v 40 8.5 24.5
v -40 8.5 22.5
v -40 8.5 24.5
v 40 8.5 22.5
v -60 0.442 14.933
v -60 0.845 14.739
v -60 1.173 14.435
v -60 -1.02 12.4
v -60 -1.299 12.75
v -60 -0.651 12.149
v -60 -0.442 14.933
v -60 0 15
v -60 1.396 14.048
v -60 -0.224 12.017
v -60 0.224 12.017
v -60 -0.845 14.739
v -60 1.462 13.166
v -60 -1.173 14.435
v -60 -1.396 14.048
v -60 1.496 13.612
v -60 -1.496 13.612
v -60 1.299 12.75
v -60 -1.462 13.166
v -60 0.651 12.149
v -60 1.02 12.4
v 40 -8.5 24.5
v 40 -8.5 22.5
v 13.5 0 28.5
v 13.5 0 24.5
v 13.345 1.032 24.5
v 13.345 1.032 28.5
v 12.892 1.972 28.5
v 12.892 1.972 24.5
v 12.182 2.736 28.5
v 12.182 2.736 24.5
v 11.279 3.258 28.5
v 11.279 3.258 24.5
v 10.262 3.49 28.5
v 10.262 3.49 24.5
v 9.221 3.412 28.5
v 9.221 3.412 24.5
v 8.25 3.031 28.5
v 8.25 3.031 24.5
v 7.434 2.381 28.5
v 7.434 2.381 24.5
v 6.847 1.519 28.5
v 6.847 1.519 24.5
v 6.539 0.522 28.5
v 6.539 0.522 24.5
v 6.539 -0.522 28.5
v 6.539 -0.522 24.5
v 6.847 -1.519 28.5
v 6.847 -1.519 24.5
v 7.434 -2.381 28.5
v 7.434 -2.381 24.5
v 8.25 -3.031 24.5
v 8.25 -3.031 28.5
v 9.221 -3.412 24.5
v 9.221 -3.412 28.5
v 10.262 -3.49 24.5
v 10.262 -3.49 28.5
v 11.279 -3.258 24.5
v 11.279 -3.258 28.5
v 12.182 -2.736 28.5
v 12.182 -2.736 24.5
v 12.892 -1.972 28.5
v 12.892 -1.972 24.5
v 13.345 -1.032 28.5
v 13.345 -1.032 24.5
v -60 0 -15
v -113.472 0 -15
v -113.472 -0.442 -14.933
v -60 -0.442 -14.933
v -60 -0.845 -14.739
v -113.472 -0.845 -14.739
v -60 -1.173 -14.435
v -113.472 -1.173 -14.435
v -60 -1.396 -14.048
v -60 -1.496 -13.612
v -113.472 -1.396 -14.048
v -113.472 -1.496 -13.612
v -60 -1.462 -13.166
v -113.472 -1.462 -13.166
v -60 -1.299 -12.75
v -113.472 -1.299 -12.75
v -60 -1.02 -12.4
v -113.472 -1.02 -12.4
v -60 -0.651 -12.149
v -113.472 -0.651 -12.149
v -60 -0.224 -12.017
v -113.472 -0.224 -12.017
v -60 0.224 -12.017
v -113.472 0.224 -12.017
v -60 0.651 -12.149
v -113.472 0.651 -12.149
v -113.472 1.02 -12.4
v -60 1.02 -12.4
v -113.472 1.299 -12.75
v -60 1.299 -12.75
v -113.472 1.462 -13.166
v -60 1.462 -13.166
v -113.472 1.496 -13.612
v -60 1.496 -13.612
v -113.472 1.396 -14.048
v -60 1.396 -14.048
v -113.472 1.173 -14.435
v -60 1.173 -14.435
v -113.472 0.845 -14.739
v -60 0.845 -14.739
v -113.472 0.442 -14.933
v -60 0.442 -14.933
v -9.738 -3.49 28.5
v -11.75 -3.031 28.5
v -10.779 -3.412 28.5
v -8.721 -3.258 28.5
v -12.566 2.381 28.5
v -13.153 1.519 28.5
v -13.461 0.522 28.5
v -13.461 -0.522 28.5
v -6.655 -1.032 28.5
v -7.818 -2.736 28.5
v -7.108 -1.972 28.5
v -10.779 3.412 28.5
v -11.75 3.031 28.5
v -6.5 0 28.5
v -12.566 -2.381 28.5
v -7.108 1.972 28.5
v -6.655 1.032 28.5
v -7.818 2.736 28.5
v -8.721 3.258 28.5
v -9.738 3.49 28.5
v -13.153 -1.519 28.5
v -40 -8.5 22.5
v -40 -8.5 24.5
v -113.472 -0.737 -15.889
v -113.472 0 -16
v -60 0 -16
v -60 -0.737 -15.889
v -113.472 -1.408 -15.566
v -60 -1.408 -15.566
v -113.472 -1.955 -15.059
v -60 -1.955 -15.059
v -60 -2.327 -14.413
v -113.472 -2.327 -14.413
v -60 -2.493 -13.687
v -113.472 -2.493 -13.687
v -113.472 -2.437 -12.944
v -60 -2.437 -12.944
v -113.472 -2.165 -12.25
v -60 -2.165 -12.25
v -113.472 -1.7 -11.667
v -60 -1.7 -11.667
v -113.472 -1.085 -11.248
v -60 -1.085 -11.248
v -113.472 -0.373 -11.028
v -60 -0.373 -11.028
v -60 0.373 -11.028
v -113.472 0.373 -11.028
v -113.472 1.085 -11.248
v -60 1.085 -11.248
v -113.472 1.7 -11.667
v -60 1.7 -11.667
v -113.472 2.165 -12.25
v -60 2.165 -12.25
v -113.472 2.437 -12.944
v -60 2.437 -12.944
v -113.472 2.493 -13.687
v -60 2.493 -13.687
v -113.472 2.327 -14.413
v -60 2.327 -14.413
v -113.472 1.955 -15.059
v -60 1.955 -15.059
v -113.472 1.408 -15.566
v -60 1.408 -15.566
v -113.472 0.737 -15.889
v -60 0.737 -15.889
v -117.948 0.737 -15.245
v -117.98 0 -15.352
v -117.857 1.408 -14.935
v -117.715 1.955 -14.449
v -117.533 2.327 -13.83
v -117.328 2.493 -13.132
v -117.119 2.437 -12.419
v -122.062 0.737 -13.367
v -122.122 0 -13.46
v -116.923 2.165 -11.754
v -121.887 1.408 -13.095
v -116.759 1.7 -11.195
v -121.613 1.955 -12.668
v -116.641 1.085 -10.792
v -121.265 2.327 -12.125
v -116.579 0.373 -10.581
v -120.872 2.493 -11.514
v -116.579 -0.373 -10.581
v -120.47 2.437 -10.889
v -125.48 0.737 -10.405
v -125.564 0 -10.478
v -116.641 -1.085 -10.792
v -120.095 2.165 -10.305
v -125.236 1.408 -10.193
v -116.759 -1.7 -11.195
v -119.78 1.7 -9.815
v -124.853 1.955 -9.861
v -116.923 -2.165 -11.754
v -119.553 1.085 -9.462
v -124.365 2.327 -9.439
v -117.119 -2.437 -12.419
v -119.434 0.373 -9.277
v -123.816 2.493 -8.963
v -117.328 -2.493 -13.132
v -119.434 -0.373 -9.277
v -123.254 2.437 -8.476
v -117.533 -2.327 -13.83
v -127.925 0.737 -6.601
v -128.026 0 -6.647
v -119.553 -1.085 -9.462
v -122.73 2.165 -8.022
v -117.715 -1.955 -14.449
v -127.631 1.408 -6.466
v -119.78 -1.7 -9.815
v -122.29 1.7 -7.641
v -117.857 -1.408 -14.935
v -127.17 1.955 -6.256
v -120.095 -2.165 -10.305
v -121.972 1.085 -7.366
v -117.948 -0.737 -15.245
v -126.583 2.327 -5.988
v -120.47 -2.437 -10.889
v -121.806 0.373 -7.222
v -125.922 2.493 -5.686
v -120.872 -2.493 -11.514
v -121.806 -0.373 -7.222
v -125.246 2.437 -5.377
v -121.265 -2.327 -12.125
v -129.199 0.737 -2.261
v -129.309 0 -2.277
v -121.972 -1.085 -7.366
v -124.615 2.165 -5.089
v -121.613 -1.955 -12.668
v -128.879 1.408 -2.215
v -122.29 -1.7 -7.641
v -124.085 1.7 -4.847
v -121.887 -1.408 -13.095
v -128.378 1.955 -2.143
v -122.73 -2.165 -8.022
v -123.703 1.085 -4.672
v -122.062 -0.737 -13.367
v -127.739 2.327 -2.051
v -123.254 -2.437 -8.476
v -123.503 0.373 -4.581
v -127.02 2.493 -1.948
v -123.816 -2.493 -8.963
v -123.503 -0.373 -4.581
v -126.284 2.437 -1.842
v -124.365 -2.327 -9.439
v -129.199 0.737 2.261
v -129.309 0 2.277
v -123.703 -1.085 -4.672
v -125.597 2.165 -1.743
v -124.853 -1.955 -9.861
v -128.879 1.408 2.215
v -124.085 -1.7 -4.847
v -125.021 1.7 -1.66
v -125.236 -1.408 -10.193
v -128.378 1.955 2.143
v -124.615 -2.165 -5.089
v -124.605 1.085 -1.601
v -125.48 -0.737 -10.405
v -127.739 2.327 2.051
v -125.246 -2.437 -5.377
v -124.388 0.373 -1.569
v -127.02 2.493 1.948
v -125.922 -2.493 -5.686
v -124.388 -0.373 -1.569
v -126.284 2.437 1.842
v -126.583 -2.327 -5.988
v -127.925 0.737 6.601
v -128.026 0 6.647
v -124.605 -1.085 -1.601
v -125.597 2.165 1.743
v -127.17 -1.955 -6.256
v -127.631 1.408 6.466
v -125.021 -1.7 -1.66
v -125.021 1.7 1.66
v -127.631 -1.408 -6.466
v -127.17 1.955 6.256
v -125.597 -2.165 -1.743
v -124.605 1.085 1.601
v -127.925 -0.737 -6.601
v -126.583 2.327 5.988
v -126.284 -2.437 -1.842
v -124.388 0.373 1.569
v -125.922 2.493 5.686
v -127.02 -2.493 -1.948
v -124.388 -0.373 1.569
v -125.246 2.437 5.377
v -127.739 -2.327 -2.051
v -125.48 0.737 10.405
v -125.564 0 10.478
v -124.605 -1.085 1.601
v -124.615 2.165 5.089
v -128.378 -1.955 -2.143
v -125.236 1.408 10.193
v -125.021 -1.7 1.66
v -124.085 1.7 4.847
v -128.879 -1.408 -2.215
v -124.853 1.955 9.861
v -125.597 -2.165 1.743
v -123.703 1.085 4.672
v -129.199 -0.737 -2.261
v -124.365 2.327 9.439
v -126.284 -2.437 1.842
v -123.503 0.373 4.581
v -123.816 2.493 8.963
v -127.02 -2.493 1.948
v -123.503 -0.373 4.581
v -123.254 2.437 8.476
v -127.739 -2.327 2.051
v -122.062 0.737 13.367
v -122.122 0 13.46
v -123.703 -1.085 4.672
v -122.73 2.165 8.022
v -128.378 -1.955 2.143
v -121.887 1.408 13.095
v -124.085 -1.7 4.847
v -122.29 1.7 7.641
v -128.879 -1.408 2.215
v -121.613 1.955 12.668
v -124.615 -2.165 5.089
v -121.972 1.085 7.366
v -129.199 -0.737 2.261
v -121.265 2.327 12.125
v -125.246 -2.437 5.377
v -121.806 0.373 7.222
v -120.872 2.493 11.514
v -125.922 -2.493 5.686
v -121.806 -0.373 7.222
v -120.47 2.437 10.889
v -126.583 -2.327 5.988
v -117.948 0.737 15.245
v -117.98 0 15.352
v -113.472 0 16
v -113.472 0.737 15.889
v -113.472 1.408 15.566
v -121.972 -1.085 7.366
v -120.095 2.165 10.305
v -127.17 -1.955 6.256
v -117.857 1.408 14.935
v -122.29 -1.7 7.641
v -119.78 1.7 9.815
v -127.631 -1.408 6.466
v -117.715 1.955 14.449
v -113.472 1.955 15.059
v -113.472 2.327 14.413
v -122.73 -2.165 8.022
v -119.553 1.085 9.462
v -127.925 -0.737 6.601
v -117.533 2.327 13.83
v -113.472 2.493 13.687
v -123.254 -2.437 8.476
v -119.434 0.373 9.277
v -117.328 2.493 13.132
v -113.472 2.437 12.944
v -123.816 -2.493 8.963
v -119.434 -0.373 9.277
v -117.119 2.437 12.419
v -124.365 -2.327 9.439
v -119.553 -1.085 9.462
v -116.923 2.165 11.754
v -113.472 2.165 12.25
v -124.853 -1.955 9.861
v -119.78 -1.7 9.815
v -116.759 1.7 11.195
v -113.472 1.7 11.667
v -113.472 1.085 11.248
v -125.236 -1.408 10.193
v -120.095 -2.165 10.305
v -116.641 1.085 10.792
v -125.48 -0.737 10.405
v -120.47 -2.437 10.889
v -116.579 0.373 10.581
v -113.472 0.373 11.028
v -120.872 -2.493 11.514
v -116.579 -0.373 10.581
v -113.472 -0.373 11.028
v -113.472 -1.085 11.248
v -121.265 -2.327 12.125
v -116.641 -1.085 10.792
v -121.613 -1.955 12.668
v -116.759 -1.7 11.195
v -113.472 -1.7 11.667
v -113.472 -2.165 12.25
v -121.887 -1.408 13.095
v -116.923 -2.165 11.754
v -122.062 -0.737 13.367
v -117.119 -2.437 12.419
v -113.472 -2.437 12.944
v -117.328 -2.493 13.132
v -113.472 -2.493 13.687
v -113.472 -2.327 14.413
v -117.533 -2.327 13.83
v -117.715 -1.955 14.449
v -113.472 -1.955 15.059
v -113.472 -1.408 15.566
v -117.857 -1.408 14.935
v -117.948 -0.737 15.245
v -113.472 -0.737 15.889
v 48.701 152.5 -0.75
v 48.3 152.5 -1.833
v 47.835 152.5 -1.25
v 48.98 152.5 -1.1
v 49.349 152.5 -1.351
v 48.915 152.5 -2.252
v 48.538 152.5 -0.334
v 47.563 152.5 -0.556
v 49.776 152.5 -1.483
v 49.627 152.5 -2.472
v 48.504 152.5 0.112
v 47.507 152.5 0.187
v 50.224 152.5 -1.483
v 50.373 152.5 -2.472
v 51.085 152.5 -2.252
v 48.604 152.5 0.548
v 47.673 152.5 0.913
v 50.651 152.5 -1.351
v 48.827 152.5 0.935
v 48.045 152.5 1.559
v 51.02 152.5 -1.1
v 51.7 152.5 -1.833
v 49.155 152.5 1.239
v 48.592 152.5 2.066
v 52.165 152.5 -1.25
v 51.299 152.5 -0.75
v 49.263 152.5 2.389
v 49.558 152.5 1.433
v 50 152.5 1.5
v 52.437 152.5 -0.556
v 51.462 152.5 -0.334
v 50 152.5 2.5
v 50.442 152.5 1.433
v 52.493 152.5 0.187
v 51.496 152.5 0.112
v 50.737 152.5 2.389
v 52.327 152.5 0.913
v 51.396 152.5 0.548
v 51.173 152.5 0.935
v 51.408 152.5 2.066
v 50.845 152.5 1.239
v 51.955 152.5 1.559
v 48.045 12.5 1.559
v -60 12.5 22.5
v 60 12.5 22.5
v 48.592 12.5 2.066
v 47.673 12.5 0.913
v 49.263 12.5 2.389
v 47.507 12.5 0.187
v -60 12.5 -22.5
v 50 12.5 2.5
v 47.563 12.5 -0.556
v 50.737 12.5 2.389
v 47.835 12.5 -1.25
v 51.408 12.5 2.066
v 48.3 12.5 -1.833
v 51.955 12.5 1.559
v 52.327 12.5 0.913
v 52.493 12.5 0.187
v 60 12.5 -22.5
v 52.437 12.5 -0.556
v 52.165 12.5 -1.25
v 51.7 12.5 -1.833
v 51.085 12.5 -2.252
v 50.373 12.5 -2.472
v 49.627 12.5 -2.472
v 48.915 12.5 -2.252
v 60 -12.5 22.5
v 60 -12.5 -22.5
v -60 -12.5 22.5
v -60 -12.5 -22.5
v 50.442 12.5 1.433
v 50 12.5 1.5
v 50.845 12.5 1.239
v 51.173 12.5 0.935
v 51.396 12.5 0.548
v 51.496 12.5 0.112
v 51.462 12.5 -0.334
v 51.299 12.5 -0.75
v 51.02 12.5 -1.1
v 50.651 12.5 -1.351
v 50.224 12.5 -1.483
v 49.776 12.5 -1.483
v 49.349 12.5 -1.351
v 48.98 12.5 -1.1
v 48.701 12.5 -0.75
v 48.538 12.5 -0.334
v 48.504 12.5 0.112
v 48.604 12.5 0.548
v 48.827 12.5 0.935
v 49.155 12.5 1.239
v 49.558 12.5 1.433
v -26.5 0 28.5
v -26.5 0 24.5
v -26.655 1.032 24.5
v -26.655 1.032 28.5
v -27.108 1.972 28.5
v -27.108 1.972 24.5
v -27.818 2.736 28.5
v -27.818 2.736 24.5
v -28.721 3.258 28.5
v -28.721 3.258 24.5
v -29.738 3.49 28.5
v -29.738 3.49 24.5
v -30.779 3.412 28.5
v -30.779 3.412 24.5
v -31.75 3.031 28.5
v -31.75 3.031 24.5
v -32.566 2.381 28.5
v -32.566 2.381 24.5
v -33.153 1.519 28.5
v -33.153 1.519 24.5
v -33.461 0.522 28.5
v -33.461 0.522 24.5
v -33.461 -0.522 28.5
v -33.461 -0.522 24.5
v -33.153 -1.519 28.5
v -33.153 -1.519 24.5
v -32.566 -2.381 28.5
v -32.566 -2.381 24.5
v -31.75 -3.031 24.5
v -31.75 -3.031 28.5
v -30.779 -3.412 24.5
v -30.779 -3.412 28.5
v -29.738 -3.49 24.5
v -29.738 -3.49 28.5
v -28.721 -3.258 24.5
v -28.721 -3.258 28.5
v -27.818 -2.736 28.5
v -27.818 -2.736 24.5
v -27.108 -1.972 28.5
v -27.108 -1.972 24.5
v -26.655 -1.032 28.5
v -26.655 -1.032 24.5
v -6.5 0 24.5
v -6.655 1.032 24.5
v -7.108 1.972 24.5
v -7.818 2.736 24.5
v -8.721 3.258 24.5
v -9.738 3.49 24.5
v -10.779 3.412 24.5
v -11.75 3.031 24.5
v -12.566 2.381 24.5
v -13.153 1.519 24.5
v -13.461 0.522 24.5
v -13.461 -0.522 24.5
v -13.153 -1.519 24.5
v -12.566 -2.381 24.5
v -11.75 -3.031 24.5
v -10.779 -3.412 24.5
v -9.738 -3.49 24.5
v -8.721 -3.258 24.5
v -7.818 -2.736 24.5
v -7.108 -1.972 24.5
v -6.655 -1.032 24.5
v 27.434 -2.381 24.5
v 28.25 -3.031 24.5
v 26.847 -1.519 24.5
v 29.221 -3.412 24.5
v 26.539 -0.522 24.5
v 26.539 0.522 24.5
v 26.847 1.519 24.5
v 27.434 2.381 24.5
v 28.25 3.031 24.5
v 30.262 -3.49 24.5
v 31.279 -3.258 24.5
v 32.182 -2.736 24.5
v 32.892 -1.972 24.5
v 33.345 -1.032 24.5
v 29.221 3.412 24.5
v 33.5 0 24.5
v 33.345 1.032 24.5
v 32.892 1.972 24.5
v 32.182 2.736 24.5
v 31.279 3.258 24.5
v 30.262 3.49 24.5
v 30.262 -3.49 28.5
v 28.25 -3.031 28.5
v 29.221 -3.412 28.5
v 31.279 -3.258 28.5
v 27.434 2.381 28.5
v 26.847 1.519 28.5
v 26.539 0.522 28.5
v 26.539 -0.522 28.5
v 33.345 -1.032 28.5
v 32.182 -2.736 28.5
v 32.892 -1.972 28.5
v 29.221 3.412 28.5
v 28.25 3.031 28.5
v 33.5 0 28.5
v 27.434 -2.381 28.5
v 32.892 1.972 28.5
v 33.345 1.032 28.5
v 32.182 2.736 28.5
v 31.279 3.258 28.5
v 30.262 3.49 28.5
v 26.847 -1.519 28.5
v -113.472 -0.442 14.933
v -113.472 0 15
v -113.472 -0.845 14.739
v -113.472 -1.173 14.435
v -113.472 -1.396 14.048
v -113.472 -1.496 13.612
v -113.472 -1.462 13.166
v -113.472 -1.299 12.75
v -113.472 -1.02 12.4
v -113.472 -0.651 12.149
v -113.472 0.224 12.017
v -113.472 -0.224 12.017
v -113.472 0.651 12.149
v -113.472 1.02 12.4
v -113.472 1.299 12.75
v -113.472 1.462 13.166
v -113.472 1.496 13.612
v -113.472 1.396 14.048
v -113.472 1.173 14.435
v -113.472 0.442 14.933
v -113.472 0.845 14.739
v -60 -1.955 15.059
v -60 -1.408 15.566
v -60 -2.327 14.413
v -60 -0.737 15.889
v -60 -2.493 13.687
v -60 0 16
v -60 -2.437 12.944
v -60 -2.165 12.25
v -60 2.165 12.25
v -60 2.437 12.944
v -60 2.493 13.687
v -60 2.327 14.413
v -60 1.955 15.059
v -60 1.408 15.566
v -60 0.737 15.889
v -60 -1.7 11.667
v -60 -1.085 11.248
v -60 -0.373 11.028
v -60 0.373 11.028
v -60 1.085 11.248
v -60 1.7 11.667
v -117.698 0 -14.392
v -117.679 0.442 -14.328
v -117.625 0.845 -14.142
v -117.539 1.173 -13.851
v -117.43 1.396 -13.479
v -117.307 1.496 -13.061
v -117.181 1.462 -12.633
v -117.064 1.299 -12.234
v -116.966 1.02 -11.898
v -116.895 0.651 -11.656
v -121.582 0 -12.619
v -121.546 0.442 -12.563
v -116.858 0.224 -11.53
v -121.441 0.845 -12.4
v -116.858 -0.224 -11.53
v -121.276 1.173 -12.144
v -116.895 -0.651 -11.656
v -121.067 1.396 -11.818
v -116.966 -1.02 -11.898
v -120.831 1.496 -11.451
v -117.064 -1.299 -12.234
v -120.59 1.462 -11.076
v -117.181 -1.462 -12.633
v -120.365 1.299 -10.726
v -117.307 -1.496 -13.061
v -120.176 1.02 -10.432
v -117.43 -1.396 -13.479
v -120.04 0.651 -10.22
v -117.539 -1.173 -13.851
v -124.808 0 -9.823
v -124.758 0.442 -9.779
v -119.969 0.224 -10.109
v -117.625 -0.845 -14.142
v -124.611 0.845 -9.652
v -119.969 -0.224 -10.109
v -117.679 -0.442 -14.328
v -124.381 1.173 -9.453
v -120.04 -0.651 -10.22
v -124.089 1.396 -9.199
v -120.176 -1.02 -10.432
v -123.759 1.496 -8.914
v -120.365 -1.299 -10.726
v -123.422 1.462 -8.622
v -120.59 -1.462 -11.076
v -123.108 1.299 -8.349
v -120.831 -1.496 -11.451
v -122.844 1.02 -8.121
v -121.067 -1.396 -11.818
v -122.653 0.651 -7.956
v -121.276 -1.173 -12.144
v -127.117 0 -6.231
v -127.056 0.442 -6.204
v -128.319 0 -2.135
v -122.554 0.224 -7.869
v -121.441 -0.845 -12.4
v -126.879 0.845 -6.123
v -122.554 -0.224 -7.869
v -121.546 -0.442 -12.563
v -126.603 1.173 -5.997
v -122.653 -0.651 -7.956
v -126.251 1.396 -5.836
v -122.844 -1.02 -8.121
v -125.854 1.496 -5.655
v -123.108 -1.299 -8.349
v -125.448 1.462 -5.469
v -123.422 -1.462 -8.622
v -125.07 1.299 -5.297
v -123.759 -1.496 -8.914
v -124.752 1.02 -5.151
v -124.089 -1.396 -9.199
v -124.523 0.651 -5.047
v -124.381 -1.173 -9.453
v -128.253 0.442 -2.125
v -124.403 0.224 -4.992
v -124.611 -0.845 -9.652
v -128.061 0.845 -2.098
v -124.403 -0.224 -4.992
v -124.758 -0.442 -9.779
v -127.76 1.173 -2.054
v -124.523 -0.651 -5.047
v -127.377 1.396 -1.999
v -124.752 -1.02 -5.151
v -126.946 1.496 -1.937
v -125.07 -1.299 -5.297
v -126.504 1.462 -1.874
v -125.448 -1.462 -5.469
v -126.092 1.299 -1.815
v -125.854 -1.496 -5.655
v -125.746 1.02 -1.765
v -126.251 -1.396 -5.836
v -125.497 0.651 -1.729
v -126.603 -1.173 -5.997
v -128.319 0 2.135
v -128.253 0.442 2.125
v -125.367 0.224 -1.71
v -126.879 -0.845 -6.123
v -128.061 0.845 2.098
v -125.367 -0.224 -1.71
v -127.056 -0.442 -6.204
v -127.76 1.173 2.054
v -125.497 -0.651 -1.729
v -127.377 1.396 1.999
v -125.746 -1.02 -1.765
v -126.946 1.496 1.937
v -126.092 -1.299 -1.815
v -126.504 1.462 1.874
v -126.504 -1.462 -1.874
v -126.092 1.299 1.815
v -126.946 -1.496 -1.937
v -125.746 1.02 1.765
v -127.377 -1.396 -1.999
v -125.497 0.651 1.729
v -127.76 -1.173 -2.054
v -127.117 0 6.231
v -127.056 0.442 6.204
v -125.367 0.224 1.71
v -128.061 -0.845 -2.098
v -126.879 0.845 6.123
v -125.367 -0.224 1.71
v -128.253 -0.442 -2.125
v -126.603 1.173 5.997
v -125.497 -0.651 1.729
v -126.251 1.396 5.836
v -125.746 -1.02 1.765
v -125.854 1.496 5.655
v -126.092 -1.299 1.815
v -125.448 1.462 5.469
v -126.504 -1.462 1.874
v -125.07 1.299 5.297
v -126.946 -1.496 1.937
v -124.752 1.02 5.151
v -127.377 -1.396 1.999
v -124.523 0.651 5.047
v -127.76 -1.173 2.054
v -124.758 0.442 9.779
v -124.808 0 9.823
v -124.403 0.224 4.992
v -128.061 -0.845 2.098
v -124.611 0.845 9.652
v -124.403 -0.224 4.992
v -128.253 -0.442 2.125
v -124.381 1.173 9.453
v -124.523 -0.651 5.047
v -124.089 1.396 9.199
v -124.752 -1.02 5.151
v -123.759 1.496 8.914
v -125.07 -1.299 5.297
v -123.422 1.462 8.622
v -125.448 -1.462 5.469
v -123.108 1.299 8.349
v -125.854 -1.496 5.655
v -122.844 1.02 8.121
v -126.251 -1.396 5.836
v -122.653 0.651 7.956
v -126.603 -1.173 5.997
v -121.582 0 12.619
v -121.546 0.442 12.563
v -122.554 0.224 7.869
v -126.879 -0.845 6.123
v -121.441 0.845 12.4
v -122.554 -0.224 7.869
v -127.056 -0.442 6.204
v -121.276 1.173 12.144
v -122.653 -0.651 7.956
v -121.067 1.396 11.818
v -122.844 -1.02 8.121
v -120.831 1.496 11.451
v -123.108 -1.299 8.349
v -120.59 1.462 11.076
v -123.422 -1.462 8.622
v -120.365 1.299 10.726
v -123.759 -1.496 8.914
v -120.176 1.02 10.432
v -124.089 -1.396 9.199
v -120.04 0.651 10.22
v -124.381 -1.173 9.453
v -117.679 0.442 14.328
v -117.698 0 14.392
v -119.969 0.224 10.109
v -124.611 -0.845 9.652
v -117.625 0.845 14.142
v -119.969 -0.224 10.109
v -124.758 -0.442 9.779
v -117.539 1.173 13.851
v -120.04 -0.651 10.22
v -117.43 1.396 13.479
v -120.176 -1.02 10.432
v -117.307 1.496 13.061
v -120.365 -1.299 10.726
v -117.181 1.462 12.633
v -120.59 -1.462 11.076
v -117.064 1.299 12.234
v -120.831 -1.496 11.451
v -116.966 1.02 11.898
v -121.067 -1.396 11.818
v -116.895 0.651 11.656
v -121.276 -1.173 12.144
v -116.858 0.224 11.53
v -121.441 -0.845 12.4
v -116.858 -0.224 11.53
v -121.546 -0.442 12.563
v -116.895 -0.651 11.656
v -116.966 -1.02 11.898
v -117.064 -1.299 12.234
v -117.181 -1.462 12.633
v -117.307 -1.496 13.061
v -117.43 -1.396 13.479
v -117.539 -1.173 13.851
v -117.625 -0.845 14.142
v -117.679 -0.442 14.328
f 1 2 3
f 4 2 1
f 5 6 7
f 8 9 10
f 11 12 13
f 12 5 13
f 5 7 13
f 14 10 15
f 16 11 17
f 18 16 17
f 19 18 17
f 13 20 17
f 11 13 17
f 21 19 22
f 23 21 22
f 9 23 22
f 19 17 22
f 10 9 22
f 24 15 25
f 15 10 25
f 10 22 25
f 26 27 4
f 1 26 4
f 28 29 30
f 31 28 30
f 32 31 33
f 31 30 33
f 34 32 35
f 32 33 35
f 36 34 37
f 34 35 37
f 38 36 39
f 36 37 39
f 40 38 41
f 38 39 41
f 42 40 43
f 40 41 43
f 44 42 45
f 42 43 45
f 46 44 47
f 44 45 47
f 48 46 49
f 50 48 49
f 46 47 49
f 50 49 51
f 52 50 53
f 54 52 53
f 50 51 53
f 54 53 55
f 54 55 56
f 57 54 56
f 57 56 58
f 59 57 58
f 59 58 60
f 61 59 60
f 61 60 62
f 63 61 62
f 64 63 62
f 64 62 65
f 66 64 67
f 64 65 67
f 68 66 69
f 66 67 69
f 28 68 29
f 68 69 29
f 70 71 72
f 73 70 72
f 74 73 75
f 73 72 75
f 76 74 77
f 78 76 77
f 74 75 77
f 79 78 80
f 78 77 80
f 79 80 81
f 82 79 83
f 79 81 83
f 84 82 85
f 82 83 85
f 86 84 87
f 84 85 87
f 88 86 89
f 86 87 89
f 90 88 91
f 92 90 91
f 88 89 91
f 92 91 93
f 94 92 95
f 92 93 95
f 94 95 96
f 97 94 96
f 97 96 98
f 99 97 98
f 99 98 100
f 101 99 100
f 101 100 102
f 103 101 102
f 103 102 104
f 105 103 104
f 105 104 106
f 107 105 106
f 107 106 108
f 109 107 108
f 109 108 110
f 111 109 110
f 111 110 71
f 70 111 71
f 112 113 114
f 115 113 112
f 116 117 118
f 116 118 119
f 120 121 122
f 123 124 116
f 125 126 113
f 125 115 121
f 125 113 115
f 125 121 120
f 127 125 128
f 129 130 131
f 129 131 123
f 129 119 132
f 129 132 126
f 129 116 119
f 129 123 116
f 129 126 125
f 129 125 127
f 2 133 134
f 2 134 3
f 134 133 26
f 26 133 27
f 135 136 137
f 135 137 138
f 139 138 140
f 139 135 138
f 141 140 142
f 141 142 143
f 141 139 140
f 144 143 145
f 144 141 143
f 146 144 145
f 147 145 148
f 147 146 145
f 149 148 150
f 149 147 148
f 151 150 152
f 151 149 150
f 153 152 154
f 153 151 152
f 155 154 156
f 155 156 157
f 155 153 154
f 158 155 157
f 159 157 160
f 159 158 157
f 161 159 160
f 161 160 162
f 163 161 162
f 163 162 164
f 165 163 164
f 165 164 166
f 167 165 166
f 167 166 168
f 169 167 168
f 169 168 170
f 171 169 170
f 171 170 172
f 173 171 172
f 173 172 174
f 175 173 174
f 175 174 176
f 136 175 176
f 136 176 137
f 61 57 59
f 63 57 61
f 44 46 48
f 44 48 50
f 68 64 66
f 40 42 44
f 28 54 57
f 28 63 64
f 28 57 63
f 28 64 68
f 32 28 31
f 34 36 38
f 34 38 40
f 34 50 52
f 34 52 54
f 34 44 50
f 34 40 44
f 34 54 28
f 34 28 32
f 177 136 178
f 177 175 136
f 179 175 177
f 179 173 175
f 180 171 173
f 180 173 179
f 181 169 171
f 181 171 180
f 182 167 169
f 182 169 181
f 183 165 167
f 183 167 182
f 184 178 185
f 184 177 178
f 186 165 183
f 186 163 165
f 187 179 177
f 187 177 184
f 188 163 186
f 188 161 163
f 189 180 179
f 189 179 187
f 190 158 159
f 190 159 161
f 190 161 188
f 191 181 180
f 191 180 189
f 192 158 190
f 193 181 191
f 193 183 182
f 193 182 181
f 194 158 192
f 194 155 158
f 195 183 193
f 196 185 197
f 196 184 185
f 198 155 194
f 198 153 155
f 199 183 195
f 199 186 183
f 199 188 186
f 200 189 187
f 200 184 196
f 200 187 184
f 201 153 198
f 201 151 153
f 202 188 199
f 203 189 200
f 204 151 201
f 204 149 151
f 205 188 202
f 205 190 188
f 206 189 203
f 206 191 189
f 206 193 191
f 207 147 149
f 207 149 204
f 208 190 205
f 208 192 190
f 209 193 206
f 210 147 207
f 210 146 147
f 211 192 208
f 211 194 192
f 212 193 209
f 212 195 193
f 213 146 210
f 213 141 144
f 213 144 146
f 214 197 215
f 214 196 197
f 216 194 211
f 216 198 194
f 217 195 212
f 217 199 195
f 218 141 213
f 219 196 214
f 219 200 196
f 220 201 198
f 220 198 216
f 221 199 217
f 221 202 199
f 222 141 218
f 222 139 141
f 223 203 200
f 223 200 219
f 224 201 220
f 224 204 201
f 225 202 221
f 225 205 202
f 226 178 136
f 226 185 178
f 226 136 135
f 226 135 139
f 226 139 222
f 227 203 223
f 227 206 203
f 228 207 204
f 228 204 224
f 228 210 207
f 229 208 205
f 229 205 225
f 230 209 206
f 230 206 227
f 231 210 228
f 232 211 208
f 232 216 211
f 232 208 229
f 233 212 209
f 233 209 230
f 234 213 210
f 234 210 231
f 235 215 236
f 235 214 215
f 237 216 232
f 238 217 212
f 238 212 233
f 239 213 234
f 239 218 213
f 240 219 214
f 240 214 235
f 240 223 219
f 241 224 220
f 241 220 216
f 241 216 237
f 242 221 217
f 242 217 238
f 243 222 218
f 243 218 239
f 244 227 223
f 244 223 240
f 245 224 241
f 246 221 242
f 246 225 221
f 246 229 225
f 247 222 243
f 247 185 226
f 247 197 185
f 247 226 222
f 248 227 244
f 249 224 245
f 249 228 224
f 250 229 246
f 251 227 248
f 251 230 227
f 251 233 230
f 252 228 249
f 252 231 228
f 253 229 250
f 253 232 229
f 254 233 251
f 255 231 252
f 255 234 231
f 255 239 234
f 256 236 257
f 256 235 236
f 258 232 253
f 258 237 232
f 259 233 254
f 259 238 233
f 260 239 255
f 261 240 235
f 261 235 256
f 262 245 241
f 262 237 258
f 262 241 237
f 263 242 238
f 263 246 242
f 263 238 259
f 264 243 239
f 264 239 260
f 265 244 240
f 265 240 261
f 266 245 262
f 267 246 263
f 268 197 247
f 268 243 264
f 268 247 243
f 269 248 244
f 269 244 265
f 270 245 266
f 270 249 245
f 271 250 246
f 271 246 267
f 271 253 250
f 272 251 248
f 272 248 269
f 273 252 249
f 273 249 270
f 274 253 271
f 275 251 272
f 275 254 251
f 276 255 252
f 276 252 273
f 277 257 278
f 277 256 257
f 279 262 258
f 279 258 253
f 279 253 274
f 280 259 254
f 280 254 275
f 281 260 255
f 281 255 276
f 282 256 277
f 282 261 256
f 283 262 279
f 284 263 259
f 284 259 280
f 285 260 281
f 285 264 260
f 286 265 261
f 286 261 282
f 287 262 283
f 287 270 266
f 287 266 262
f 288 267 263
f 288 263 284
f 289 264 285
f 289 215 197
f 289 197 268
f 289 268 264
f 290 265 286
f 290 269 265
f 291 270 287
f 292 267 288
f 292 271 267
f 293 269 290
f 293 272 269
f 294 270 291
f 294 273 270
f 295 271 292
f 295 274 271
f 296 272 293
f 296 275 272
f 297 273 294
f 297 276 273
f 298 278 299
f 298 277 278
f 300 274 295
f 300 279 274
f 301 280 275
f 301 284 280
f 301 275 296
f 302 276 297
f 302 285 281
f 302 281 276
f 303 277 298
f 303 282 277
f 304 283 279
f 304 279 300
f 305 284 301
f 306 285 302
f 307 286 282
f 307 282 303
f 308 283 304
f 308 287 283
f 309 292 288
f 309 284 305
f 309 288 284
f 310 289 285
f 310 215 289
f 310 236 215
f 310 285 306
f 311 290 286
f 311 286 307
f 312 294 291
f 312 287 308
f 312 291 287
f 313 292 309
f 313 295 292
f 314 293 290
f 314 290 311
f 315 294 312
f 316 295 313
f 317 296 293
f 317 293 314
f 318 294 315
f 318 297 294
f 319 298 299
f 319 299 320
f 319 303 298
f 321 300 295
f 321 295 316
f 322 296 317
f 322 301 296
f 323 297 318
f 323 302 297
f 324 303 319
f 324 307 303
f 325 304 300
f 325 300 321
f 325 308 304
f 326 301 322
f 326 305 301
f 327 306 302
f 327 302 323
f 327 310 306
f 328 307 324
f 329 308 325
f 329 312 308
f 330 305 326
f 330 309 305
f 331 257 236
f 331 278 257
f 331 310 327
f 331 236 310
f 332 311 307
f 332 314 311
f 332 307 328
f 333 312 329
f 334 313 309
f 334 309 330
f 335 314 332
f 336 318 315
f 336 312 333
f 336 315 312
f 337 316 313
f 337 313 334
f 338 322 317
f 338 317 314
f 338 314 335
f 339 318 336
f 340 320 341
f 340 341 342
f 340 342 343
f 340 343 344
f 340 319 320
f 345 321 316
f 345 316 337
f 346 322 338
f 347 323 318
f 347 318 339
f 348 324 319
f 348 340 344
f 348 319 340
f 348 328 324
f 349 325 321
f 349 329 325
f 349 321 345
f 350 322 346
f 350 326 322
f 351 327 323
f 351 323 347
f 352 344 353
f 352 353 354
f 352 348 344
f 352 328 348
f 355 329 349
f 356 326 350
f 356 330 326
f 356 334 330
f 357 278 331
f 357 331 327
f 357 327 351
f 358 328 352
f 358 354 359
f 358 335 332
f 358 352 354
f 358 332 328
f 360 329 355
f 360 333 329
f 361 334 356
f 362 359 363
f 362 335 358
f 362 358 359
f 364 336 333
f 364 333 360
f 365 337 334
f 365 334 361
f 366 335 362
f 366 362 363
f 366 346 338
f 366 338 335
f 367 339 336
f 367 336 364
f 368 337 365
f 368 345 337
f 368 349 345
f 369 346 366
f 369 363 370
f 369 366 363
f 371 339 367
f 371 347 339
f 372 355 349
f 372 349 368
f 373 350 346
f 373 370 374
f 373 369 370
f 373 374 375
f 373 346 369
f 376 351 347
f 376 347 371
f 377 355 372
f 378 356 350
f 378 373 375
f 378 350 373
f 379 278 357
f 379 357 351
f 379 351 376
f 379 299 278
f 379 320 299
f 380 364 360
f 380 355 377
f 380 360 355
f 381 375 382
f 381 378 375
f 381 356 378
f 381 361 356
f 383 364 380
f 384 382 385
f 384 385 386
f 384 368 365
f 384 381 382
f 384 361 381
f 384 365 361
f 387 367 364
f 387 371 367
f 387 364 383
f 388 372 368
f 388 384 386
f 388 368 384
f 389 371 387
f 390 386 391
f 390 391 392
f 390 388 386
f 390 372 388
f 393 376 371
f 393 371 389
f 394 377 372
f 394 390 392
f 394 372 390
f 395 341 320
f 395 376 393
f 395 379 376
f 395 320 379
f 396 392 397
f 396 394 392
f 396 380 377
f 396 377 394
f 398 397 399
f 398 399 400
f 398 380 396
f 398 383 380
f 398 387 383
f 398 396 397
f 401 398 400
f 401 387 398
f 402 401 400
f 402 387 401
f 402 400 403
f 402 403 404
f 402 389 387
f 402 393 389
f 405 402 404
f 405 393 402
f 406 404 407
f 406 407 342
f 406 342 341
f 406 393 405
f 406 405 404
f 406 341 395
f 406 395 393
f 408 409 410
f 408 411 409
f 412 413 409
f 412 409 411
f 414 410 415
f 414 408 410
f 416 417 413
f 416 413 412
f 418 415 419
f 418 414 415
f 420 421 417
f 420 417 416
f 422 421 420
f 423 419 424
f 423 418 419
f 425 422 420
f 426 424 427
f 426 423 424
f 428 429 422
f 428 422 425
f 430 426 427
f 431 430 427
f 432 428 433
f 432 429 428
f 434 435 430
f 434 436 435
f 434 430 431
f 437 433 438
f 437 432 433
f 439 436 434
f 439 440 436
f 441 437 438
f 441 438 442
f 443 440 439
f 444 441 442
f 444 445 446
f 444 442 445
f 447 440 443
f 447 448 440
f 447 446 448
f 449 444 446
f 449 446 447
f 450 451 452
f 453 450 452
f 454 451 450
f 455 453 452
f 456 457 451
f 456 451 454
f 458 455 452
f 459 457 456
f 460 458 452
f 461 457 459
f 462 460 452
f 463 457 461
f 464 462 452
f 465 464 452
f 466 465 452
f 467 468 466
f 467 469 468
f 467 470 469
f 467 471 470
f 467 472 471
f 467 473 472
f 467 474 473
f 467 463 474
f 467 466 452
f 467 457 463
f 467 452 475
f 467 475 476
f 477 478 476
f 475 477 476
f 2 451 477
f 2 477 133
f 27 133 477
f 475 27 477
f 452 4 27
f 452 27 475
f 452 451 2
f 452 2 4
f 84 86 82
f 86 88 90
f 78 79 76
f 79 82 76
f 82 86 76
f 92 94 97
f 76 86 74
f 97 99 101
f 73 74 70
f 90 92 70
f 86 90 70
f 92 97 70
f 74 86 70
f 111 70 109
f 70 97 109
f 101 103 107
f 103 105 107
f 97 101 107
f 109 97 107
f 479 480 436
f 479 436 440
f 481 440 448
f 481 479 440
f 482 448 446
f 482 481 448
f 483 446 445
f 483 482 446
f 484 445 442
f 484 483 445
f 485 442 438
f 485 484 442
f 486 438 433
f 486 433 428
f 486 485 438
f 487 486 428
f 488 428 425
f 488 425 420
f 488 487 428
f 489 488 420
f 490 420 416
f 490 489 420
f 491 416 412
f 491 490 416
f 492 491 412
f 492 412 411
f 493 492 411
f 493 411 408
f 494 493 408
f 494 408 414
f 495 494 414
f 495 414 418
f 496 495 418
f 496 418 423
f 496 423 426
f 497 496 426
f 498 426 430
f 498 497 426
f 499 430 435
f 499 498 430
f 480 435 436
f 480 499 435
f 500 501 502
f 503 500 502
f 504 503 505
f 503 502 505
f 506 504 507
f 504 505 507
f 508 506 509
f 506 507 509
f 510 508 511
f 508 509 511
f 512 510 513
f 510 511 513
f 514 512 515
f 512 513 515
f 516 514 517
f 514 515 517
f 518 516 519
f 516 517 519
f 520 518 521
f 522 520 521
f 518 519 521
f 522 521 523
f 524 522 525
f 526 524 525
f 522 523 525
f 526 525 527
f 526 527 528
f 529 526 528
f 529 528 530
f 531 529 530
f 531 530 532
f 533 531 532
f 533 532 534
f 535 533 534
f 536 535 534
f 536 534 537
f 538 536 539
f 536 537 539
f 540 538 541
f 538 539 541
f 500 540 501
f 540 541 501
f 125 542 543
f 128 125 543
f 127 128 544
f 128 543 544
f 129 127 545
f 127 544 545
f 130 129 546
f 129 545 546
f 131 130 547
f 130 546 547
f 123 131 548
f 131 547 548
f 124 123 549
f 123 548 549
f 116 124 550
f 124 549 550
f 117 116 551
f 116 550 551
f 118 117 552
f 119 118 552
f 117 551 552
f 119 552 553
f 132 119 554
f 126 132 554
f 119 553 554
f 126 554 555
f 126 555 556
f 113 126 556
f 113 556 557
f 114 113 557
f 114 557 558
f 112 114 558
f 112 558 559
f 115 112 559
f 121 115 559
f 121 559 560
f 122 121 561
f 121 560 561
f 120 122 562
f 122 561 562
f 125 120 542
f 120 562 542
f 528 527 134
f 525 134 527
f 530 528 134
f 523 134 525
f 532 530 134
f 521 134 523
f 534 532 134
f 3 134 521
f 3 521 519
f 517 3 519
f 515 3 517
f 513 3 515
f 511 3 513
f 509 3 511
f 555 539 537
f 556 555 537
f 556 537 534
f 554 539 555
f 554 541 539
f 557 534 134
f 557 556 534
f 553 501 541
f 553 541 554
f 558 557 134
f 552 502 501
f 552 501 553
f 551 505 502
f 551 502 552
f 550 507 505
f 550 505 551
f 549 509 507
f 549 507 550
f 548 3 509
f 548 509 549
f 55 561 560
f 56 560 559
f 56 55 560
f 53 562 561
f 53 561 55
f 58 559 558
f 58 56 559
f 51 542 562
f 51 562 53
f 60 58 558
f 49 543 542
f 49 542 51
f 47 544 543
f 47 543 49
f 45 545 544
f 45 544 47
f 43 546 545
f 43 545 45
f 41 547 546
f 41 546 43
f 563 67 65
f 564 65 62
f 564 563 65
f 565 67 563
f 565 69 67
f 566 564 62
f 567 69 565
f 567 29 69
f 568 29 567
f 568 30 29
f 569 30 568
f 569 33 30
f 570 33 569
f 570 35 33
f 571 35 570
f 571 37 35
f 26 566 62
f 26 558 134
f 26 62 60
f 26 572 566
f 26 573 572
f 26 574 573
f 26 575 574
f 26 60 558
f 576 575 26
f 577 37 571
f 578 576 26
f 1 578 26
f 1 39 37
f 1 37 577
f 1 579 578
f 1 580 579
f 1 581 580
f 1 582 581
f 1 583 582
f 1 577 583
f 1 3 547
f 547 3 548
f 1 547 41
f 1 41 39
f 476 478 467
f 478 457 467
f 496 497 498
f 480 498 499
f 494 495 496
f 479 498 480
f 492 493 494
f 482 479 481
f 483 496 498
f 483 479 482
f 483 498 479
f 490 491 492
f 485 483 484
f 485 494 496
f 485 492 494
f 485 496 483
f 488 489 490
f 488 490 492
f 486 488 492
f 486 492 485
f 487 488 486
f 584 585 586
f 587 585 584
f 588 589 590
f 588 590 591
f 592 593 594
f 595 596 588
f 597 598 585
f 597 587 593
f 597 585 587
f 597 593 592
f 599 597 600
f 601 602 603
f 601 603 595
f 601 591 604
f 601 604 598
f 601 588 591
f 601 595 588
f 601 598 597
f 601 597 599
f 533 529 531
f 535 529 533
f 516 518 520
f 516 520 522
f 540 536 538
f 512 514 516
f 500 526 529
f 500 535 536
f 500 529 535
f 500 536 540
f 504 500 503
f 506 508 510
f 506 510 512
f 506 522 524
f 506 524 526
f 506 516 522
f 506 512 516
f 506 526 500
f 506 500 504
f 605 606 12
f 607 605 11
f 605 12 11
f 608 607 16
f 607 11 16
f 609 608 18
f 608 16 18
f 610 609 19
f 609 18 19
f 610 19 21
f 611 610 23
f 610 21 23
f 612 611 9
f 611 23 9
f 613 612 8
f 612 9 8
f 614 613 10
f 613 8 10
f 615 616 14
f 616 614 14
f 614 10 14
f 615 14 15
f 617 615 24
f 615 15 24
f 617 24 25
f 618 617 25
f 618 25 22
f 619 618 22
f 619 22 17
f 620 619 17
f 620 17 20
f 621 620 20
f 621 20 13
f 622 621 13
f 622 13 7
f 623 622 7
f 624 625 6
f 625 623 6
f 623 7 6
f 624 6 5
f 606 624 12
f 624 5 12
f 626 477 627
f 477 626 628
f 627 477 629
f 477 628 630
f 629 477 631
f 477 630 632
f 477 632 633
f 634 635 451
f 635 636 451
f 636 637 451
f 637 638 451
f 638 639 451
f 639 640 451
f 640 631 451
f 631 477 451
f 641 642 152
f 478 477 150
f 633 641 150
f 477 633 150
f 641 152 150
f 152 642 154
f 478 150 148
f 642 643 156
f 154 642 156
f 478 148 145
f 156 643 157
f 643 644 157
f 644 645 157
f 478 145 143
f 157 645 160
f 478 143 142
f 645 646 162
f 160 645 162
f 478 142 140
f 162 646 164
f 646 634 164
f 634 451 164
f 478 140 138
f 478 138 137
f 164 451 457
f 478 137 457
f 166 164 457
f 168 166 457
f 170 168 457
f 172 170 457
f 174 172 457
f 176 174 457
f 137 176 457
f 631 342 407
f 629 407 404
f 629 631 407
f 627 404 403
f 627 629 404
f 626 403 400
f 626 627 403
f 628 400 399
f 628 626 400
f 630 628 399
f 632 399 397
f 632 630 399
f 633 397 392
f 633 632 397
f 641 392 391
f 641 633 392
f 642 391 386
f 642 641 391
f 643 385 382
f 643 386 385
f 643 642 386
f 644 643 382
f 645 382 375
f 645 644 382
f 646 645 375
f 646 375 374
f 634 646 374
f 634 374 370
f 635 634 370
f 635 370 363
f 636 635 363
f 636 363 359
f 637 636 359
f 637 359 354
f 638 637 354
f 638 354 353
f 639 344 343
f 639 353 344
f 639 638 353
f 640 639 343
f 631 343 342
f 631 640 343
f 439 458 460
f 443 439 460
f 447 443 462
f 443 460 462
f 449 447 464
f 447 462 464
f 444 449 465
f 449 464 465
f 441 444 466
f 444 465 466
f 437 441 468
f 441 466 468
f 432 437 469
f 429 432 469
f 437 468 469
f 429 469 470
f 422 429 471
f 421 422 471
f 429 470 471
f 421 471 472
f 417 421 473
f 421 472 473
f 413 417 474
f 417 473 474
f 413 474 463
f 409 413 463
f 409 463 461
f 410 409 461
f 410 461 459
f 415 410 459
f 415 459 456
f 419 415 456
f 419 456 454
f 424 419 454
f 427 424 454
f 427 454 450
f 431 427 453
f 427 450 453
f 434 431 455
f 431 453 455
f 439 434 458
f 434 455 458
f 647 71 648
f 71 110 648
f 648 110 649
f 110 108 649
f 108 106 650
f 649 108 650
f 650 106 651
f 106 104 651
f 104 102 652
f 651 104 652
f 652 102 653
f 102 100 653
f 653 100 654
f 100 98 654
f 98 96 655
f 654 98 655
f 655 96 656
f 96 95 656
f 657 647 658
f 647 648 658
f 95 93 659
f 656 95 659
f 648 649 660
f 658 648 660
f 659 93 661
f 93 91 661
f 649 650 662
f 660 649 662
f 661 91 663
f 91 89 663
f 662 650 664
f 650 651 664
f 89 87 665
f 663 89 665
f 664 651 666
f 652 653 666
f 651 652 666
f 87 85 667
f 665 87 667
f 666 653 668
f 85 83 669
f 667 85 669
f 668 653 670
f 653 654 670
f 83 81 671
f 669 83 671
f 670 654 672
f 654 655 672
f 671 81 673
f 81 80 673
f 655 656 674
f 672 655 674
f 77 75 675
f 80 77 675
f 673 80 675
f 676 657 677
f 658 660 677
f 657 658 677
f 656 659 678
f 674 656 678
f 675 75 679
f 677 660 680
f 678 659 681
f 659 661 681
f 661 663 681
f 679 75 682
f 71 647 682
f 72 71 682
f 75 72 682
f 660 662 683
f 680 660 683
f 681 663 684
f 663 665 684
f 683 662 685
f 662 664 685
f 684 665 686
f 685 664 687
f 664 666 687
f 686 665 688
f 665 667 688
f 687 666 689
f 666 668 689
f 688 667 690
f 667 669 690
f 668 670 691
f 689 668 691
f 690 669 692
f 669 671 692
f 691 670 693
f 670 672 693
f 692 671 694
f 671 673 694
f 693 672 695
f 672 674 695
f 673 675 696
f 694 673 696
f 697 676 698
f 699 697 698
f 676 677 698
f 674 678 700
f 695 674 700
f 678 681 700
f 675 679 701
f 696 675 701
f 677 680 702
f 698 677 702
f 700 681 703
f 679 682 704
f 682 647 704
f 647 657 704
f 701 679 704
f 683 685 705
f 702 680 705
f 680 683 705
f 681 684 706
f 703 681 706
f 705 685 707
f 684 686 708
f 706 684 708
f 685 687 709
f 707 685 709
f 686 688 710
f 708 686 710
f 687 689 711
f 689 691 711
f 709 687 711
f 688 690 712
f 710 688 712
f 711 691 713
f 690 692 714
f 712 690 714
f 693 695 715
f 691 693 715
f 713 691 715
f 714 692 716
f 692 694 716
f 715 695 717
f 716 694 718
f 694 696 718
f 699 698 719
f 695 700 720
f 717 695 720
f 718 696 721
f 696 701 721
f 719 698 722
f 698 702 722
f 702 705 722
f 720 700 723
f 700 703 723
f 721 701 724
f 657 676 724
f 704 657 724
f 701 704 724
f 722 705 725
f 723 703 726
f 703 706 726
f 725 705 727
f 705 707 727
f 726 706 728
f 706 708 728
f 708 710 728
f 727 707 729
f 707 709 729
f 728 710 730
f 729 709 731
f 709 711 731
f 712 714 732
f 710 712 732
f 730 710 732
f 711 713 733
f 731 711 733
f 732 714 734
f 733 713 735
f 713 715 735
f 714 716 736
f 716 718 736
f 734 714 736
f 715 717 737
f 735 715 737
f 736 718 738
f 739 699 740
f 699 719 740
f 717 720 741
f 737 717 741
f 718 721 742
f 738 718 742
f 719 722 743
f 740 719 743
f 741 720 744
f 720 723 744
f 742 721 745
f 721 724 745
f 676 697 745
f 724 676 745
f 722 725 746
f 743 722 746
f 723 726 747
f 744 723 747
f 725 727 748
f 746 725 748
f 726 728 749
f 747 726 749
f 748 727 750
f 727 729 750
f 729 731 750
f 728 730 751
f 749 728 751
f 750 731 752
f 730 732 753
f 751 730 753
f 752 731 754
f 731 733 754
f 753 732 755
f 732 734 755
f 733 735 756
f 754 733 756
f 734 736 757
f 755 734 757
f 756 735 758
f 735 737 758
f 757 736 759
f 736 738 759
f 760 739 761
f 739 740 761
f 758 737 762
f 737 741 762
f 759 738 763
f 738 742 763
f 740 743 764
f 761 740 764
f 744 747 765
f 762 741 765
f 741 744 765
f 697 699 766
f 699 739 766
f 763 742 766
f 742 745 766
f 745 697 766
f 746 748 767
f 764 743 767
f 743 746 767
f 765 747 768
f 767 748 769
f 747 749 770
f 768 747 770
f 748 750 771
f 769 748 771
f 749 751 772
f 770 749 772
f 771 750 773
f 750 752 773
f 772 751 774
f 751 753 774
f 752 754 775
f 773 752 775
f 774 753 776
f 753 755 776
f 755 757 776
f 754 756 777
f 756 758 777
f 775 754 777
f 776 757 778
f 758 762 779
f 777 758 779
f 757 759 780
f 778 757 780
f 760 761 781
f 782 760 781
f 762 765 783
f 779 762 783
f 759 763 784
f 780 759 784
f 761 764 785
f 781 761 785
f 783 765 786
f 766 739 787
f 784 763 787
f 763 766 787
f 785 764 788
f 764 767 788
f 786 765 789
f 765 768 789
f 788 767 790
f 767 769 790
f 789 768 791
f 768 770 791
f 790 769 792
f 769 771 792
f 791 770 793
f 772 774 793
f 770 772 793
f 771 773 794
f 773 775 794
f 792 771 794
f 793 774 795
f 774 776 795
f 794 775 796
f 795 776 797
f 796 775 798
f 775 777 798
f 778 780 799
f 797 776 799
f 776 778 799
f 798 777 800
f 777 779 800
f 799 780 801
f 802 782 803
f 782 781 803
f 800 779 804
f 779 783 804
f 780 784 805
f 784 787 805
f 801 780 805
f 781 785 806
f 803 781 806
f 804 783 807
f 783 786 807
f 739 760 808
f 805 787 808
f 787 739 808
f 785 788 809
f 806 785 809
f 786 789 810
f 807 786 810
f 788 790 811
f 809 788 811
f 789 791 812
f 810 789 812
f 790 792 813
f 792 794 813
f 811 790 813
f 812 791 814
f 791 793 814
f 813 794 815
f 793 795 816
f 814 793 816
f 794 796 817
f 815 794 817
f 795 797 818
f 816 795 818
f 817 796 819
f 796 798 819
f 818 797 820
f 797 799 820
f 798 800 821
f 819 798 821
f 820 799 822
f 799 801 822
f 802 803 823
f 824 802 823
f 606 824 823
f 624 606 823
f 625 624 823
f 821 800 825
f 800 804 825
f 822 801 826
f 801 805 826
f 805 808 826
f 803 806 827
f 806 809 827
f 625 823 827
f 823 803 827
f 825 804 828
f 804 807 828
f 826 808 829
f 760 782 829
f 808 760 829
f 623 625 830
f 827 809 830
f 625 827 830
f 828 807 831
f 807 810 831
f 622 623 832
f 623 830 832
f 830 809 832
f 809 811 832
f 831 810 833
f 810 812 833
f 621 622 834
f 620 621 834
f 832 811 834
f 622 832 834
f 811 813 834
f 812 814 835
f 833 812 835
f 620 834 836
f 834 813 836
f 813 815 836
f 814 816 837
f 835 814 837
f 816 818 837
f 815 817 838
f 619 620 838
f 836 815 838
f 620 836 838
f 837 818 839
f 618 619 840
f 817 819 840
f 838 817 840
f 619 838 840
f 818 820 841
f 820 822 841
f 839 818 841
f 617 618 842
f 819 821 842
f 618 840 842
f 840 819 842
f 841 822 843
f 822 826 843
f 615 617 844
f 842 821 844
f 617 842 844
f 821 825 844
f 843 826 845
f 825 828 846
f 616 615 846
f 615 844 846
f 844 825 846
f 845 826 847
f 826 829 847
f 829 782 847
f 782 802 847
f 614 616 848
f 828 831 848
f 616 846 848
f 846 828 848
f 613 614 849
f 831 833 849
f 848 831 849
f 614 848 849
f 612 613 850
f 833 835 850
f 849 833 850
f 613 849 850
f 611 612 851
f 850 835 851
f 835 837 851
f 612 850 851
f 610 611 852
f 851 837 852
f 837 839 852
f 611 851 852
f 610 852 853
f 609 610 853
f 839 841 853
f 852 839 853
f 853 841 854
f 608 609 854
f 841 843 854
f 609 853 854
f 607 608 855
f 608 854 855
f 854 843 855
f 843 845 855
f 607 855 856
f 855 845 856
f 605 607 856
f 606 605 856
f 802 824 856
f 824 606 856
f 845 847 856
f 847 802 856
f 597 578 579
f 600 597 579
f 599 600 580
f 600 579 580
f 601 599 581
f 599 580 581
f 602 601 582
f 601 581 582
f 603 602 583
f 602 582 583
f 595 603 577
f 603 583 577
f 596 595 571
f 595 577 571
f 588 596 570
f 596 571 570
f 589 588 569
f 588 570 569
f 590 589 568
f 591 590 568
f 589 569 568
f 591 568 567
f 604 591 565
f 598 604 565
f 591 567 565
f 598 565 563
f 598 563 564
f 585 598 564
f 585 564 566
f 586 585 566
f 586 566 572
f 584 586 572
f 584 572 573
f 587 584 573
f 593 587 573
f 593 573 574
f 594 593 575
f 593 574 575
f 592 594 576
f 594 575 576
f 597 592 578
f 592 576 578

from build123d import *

# Parameters (mm, degrees)
SKETCH1_W               = 120
SKETCH1_H               = 45
BOSS_EXTRUDE1_DEPTH     = 12.5
SKETCH3_R               = 2.5
SKETCH3_R_2             = 1.5
BOSS_EXTRUDE2_DEPTH     = 140
SWEEP_THIN2_PROFILE_R   = 2.5
SWEEP_THIN2_PROFILE_R_2 = 1.5
SKETCH53_W              = 80
SKETCH53_H              = 17
BOSS_EXTRUDE3_DEPTH     = 2
SKETCH54_R              = 3.5
BOSS_EXTRUDE4_DEPTH     = 4
LPATTERN1_COUNT         = 2
LPATTERN1_PITCH         = 20
LPATTERN1_COL_COUNT     = 3
LPATTERN1_COL_PITCH     = 20


with BuildPart() as part:
    # Sketch1 → Boss-Extrude1 (new, symmetric)
    with BuildSketch(Plane(origin=(0, 0, 0), x_dir=(1, 0, 0), z_dir=(0, 1, 0))):
        Rectangle(SKETCH1_W, SKETCH1_H)
    extrude(amount=BOSS_EXTRUDE1_DEPTH, both=True)

    # Sketch3 → Boss-Extrude2 (add)
    with BuildSketch(Plane(origin=(0, 12.5, 0), x_dir=(1, 0, 0), z_dir=(0, 1, 0))):
        with Locations((50, 0)):
            Circle(SKETCH3_R)
        with Locations((50, 0)):
            Circle(SKETCH3_R_2, mode=Mode.SUBTRACT)
    extrude(amount=BOSS_EXTRUDE2_DEPTH)

    # Sweep-Thin2: sweep along a path in Sketch57
    with BuildLine(Plane(origin=(0, 0, 0), x_dir=(1, 0, 0), z_dir=(0, 1, 0))) as sweep_thin2_path:
        Line((-60, 13.5), (-113.472065941, 13.5))
        ThreePointArc((-113.472065941, 13.5), (-126.972065941, 0), (-113.472065941, -13.5))
        Line((-113.472065941, -13.5), (-60, -13.5))
    # Sweep-Thin2 profile (on start of the path) → Sweep-Thin2 (sweep)
    with BuildSketch(Plane(origin=(-60, 0, -13.5), x_dir=(0, 0, -1), z_dir=(-1, 0, 0))):
        Circle(SWEEP_THIN2_PROFILE_R)
        Circle(SWEEP_THIN2_PROFILE_R_2, mode=Mode.SUBTRACT)
    sweep(path=sweep_thin2_path.line)

    # Sketch53 → Boss-Extrude3 (add)
    with BuildSketch(Plane.XY.offset(22.5)):
        Rectangle(SKETCH53_W, SKETCH53_H)
    extrude(amount=BOSS_EXTRUDE3_DEPTH)

    # Sketch54 → Boss-Extrude4 (add)
    with BuildSketch(Plane.XY.offset(24.5)):
        with Locations((-10, 0)):
            Circle(SKETCH54_R)
    boss_extrude4 = extrude(amount=BOSS_EXTRUDE4_DEPTH)

    # LPattern1: Boss-Extrude4 ×2
    with Locations(*[(-i * LPATTERN1_PITCH, 0, 0) for i in range(1, LPATTERN1_COUNT)]):
        add(boss_extrude4)

    # LPattern1 col: Boss-Extrude4 ×3
    with Locations(*[(i * LPATTERN1_COL_PITCH, 0, 0) for i in range(1, LPATTERN1_COL_COUNT)]):
        add(boss_extrude4)


solid = part.part
